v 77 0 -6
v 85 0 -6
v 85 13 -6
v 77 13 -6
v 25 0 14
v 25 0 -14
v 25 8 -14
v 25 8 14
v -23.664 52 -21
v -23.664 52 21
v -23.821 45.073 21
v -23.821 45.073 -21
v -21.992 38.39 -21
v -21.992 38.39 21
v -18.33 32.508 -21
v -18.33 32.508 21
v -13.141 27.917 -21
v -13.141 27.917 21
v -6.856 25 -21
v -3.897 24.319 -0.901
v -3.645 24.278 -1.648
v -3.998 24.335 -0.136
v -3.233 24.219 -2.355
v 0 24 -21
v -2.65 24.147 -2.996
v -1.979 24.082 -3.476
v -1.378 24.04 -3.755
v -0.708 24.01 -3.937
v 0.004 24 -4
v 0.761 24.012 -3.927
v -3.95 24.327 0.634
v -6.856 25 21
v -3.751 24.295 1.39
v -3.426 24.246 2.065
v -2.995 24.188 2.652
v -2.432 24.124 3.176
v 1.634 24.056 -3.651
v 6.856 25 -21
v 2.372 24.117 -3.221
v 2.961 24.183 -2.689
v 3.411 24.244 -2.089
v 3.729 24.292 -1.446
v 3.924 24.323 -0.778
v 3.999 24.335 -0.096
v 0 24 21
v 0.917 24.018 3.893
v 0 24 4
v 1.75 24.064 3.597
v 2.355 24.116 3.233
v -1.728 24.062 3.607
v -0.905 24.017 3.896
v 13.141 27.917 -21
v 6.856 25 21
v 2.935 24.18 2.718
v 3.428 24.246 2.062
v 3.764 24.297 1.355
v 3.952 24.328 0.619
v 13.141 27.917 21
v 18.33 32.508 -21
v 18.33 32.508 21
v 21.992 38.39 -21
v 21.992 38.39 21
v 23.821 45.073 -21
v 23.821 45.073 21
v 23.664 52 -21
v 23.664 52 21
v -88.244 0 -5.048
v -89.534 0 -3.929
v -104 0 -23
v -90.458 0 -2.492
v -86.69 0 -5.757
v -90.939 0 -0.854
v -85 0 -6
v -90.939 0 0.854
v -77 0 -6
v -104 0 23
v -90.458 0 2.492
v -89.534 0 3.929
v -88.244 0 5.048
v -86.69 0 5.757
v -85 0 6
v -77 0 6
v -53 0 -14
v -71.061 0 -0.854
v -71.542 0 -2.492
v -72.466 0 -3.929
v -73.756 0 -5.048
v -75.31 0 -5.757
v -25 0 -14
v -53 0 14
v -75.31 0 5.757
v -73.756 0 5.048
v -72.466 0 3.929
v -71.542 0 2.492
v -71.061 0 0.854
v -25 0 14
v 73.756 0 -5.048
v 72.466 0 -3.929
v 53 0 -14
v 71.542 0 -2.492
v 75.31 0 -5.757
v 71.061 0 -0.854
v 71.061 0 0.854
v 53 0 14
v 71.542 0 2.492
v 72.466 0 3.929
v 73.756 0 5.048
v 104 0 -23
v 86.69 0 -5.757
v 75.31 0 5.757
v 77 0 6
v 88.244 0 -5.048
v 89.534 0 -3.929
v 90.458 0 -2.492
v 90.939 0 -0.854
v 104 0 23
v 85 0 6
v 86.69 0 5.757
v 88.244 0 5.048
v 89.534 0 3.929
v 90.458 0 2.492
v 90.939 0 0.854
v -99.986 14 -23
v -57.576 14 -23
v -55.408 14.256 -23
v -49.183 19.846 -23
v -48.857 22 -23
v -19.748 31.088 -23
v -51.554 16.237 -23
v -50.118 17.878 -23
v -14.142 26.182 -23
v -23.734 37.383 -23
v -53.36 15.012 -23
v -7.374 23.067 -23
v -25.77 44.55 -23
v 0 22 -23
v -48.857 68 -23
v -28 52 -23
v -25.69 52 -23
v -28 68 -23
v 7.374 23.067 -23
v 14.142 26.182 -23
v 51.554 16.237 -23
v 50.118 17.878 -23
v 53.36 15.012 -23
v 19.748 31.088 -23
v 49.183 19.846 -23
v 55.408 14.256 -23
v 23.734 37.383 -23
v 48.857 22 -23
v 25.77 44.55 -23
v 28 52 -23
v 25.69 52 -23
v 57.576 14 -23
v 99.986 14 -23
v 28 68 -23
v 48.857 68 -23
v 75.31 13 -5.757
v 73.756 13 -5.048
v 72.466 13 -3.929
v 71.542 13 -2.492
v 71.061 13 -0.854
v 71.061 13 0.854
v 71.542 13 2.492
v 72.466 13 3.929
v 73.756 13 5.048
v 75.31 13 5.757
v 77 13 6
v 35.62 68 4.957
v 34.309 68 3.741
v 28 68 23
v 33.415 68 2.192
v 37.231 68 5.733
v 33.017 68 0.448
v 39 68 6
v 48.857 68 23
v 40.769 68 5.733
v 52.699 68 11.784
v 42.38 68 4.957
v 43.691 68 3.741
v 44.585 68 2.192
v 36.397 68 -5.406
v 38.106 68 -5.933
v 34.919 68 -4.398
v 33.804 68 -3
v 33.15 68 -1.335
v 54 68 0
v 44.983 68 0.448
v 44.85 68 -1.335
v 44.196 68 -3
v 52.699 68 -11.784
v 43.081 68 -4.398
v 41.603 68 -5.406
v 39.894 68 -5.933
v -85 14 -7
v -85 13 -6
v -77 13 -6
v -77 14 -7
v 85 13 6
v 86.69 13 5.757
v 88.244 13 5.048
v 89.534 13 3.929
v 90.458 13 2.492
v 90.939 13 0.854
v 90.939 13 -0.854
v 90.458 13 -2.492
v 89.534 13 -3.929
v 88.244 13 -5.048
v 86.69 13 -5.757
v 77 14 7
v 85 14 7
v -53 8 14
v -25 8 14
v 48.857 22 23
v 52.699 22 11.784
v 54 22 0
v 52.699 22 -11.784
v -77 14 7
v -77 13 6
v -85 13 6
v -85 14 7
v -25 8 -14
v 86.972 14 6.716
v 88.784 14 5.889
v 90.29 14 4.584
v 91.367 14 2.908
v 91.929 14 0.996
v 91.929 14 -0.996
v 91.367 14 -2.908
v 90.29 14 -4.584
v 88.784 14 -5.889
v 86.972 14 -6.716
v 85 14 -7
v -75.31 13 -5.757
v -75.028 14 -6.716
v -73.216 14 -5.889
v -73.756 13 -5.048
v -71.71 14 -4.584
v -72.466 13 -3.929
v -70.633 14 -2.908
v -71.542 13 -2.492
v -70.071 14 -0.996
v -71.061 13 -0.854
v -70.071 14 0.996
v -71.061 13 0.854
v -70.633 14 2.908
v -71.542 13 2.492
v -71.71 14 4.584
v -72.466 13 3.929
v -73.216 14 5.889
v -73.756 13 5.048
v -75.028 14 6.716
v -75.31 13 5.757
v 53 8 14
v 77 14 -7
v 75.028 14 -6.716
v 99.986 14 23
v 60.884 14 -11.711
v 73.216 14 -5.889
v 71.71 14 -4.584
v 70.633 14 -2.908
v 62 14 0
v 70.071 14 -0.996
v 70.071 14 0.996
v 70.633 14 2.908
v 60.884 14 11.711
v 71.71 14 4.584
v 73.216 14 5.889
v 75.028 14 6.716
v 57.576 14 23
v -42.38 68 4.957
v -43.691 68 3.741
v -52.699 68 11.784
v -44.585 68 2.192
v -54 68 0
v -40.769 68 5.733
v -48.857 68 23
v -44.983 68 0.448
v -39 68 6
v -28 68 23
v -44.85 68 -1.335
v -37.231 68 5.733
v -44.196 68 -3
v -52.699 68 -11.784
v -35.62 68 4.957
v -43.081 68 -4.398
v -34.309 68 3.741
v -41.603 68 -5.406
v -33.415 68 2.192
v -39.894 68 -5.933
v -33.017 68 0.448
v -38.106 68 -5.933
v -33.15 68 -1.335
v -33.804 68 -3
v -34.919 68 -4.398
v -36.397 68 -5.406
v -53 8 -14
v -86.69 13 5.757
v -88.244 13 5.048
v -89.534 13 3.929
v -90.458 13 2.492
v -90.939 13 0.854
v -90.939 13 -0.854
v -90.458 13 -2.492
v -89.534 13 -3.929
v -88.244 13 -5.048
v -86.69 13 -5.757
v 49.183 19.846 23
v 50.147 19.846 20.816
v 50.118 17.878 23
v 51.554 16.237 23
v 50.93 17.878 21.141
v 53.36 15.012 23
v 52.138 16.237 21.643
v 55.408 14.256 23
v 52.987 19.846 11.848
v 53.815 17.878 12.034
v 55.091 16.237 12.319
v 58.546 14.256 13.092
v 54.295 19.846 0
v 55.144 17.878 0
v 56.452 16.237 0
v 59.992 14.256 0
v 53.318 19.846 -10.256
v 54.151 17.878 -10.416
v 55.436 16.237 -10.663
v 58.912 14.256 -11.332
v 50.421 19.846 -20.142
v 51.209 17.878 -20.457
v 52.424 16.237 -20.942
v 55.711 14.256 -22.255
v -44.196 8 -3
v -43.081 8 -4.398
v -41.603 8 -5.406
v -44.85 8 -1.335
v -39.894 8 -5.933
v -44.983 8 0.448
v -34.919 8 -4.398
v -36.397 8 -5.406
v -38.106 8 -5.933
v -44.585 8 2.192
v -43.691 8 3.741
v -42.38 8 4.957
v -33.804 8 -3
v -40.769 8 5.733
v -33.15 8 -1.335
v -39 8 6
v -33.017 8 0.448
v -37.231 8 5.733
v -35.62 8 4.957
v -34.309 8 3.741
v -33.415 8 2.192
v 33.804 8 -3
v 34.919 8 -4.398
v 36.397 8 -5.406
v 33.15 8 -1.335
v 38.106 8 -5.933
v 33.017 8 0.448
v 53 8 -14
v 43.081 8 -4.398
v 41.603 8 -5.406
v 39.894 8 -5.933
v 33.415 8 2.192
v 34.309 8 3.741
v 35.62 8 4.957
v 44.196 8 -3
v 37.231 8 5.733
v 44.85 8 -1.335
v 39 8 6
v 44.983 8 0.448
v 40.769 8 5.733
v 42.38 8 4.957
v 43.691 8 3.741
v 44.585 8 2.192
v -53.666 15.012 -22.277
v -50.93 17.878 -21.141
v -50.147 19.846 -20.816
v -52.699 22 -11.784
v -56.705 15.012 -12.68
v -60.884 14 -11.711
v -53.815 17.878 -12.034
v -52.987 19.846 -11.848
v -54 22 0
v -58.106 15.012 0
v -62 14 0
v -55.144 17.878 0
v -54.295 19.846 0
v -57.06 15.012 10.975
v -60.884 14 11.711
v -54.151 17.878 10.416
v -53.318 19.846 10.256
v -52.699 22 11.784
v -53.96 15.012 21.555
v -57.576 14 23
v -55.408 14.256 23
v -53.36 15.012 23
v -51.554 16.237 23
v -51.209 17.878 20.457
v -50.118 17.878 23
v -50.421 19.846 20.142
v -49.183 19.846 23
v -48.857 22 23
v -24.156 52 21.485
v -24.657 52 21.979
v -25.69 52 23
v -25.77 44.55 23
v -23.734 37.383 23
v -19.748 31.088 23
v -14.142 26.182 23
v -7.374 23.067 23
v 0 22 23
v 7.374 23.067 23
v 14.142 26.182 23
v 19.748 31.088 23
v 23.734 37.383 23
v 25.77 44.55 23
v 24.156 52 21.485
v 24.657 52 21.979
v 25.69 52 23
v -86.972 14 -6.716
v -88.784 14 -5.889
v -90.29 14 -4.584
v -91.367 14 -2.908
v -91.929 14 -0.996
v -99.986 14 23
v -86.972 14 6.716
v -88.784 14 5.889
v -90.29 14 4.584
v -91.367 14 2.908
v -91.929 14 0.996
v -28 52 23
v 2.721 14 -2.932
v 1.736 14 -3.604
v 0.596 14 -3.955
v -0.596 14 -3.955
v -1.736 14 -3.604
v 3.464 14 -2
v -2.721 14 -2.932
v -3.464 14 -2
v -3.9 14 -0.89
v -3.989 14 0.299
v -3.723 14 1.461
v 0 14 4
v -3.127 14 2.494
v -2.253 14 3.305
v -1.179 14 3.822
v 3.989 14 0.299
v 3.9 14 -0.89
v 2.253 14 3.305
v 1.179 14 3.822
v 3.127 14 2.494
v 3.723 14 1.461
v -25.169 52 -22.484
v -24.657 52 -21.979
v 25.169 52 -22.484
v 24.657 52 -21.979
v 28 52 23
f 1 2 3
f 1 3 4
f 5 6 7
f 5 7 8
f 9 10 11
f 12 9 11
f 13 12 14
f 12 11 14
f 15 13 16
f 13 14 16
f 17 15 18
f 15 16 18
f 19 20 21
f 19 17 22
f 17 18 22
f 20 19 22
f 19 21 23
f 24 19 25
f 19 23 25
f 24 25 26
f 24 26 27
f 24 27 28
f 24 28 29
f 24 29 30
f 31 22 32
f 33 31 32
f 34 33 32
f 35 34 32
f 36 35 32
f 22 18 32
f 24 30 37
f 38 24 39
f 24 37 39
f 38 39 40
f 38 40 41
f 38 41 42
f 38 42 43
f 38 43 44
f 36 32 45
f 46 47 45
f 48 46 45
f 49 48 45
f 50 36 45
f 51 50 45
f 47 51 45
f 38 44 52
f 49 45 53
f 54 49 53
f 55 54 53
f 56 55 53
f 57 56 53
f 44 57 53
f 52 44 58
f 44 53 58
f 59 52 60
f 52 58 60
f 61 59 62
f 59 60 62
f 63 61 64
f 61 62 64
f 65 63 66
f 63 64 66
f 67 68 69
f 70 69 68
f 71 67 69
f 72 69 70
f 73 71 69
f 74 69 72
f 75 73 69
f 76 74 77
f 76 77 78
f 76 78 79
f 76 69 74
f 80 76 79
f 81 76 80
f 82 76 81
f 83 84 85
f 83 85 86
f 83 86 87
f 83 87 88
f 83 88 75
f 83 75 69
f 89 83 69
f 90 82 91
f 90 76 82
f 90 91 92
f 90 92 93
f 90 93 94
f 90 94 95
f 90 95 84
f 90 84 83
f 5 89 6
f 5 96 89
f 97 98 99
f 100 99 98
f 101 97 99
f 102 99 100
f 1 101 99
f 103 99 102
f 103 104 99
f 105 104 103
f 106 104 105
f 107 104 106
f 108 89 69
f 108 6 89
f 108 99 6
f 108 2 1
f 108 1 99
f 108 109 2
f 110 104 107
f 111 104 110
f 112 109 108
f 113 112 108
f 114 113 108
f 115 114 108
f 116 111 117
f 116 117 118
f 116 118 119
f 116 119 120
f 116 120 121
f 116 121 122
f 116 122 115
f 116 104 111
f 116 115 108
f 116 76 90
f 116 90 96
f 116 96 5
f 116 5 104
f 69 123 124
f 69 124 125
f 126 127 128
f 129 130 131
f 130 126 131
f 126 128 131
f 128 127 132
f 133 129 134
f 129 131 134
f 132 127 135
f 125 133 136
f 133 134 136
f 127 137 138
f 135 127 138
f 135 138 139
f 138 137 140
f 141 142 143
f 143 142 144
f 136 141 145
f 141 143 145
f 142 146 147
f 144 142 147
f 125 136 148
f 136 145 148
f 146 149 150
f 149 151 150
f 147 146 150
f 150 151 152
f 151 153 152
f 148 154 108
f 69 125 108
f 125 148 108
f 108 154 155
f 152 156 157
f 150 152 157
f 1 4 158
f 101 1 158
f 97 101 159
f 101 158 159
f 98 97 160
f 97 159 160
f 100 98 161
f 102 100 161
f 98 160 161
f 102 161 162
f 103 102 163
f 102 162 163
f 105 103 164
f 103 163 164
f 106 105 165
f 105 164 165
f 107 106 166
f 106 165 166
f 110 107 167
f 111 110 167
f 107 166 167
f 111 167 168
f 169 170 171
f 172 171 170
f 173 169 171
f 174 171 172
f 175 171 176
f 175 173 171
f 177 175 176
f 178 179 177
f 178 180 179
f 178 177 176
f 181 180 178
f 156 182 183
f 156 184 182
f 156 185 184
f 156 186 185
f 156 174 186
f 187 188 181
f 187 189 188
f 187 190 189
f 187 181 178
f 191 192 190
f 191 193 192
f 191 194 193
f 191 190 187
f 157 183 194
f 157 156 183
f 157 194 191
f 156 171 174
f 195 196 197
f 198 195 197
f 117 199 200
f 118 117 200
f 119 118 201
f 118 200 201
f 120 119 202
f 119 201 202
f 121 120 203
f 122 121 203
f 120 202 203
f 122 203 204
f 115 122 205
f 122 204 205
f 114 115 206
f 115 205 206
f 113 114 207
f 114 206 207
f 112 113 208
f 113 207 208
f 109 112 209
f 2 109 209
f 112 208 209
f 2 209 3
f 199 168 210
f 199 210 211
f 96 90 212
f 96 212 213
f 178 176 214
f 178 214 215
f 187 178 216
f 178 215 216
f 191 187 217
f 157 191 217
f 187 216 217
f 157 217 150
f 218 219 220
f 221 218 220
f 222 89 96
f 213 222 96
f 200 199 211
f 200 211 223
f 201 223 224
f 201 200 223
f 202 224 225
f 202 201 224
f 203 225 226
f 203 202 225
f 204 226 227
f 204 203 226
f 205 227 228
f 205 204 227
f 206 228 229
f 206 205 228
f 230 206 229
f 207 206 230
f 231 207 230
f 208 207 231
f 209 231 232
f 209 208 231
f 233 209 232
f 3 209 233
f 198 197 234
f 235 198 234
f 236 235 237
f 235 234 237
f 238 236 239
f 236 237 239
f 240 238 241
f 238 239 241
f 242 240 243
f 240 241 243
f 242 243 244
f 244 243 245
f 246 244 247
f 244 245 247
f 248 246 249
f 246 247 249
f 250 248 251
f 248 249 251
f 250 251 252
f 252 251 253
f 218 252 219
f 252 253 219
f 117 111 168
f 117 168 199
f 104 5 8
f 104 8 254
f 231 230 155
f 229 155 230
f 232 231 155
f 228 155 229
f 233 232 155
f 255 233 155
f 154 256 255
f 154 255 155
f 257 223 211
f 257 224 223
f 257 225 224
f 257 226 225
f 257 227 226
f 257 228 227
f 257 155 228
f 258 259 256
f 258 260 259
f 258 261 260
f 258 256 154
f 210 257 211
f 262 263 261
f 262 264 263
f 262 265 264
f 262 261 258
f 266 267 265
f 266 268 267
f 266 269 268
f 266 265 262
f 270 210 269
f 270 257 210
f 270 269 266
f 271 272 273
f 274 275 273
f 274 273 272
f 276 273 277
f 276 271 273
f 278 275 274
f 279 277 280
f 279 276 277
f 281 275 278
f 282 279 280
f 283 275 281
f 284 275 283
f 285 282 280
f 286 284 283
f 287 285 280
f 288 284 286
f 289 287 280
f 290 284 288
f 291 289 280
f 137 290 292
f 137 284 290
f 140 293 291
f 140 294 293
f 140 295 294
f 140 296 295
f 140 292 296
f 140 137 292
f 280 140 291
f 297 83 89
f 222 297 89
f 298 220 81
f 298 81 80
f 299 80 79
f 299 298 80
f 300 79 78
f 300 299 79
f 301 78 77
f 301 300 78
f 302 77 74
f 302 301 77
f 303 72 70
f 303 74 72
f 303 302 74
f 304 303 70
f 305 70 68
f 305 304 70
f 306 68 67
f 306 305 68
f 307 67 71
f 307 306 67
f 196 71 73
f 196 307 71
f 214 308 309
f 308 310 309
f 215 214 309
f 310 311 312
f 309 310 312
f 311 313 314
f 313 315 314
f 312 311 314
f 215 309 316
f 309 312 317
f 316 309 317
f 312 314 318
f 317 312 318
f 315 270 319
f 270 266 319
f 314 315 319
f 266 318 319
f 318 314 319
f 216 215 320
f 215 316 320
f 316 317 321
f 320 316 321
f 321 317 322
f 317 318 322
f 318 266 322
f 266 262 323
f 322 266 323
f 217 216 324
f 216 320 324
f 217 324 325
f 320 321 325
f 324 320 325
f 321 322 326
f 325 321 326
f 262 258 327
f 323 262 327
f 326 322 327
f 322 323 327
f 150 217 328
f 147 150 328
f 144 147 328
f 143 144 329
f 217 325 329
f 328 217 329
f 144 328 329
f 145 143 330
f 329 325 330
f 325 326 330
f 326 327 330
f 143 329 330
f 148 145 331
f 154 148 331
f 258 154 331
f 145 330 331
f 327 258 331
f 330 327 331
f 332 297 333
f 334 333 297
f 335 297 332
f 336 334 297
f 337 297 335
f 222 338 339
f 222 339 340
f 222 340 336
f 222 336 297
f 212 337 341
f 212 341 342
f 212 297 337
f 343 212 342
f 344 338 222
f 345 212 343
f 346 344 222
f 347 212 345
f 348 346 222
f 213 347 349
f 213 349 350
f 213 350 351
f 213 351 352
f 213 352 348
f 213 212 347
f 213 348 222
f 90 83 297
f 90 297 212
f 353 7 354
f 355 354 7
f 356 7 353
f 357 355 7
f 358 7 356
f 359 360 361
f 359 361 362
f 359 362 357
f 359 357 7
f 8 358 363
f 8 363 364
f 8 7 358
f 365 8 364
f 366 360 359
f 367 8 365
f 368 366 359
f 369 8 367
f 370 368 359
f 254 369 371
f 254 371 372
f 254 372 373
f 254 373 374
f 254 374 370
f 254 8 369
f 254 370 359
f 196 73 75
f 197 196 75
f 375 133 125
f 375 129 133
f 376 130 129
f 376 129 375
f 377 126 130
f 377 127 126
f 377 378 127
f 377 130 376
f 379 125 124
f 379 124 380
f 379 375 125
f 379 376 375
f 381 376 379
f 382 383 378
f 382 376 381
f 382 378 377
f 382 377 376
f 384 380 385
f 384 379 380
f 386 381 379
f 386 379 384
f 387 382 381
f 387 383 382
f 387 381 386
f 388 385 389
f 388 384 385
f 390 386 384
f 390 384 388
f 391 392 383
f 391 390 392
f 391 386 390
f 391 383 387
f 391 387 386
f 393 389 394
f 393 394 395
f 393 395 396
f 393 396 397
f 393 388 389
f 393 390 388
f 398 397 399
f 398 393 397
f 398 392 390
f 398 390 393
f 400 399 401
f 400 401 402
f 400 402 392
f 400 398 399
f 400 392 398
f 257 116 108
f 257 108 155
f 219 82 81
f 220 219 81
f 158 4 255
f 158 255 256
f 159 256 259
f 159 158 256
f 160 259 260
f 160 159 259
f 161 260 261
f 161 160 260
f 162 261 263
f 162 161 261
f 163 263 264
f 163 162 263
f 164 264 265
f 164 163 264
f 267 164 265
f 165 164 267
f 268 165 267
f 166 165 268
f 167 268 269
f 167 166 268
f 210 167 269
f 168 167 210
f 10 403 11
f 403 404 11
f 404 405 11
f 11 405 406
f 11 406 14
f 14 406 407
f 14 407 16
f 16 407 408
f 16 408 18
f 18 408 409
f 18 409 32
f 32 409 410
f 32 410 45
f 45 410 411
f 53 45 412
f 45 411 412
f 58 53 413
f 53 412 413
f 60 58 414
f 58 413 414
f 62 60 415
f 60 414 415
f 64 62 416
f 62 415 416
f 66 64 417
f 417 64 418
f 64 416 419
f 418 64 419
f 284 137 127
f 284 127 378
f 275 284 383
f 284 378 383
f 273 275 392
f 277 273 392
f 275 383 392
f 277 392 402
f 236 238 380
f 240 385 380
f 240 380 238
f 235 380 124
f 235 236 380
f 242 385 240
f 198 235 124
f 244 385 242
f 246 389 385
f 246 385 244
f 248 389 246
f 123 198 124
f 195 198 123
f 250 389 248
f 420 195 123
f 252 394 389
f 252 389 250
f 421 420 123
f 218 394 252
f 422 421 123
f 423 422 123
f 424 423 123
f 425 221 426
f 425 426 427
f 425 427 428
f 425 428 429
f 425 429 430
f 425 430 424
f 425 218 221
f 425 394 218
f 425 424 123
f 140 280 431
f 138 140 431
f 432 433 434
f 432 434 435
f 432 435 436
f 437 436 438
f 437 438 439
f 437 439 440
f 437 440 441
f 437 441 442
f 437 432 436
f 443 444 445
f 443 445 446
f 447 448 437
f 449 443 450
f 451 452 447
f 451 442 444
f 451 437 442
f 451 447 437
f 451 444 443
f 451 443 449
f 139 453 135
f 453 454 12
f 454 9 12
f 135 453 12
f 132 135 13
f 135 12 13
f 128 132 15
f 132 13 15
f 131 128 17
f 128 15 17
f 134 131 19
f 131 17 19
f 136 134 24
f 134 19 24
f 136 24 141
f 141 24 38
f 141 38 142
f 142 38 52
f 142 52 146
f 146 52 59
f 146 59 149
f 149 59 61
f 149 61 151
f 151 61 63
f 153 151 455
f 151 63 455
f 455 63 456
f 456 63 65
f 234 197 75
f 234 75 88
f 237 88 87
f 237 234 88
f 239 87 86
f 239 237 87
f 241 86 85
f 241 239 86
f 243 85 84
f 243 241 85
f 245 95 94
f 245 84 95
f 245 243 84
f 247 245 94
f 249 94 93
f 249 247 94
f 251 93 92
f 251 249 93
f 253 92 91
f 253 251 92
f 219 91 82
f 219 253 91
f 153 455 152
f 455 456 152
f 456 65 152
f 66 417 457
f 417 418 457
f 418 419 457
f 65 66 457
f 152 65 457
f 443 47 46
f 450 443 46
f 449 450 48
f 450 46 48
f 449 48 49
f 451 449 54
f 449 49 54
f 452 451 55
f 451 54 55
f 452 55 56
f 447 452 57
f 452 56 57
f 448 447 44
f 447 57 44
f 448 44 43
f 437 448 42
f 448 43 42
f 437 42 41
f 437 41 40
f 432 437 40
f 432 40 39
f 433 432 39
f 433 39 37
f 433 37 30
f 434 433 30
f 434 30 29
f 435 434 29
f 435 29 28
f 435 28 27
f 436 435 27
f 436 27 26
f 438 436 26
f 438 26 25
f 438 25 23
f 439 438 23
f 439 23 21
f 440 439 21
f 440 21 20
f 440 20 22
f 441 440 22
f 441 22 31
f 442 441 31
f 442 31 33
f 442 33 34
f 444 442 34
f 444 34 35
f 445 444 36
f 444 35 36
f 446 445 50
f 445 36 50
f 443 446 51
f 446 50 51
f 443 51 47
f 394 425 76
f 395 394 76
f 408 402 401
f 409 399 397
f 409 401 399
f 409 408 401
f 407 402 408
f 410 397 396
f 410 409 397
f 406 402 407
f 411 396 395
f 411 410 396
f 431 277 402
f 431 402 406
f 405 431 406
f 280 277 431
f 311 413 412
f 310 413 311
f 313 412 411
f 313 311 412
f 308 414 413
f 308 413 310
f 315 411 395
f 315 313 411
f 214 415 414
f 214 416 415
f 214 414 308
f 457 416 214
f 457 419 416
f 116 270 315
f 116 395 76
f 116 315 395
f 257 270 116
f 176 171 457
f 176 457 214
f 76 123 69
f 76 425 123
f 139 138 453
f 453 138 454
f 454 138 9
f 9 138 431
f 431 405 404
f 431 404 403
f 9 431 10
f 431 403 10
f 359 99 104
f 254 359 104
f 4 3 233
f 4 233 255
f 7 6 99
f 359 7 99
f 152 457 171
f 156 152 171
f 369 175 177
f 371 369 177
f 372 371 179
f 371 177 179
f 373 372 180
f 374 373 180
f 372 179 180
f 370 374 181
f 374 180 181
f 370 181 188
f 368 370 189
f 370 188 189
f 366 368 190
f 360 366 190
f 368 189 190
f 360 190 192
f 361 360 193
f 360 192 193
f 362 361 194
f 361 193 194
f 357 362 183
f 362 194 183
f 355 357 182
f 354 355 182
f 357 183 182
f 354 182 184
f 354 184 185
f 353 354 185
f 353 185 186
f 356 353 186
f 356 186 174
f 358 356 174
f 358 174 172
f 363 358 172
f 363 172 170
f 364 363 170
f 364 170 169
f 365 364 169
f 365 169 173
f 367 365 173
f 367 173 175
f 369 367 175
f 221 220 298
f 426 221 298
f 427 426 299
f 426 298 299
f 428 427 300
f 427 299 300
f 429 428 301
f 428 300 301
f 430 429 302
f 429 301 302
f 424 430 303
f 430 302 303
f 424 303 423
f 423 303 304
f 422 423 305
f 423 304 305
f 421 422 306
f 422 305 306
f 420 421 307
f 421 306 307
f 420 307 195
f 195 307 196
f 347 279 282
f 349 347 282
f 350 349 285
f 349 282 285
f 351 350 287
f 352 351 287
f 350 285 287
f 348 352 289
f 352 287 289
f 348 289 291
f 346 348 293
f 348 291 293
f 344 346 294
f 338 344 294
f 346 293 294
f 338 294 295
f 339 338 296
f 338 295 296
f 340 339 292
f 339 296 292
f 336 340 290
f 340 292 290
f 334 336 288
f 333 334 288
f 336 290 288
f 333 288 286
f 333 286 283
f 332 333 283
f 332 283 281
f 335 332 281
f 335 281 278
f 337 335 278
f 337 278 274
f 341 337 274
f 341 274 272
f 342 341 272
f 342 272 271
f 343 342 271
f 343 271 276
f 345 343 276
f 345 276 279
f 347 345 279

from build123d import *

# Parameters (mm, degrees)
BOSS_EXTRUDE1_DEPTH = 23
BOSS_EXTRUDE2_DEPTH = 54
CUT_EXTRUDE1_DEPTH  = 47
SKETCH4_R           = 6
CUT_EXTRUDE2_DEPTH  = 69
SKETCH5_W           = 28
SKETCH5_H           = 28
CUT_EXTRUDE3_DEPTH  = 8
CUT_EXTRUDE4_DEPTH  = 15
SKETCH7_R           = 4
CUT_EXTRUDE5_DEPTH  = 54
FILLET1_R           = 8
CHAMFER1_SIZE       = 2
CHAMFER2_SIZE       = 1


with BuildPart() as part:
    # Sketch1 → Boss-Extrude1 (new body, symmetric)
    with BuildSketch(Plane.XY):
        Polygon((-104, 0), (104, 0), (99.985564599, 14), (-99.985564599, 14), align=None)
    extrude(amount=BOSS_EXTRUDE1_DEPTH, both=True)

    # Sketch2 → Boss-Extrude2 (add)
    with BuildSketch(Plane(origin=(0, 14, 0), x_dir=(1, 0, 0), z_dir=(0, 1, 0))):
        with BuildLine():
            Line((48.856934001, 23), (-48.856934001, 23))
            ThreePointArc((-48.856934001, 23), (-54, 0), (-48.856934001, -23))
            Line((-48.856934001, -23), (48.856934001, -23))
            ThreePointArc((48.856934001, -23), (54, 0), (48.856934001, 23))
        make_face()
    extrude(amount=BOSS_EXTRUDE2_DEPTH)

    # Sketch3 → Cut-Extrude1 (cut, through all)
    with BuildSketch(Plane.XY.offset(23)):
        with BuildLine():
            Line((-28, 68), (-28, 52))
            Line((-28, 52), (-23.664319132, 52))
            ThreePointArc((-23.664319132, 52), (0, 24), (23.664319132, 52))
            Line((23.664319132, 52), (28, 52))
            Line((28, 52), (28, 68))
            Line((28, 68), (-28, 68))
        make_face()
    extrude(amount=-CUT_EXTRUDE1_DEPTH, mode=Mode.SUBTRACT)

    # Sketch4 → Cut-Extrude2 (cut, through all)
    with BuildSketch(Plane(origin=(0, 68, 0), x_dir=(1, 0, 0), z_dir=(0, 1, 0))):
        with Locations(Location((-39, 0, 0), (0, 0, 270))):  # turned: the seam where the file's is
            Circle(SKETCH4_R)
        with Locations(Location((39, 0, 0), (0, 0, 270))):  # turned: the seam where the file's is
            Circle(SKETCH4_R)
    extrude(amount=-CUT_EXTRUDE2_DEPTH, mode=Mode.SUBTRACT)

    # Sketch5 → Cut-Extrude3 (cut)
    with BuildSketch(Plane.XZ):
        with Locations((-39, 0)):
            Rectangle(SKETCH5_W, SKETCH5_H)
        with Locations((39, 0)):
            Rectangle(SKETCH5_W, SKETCH5_H)
    extrude(amount=-CUT_EXTRUDE3_DEPTH, mode=Mode.SUBTRACT)

    # Sketch6 → Cut-Extrude4 (cut, through all)
    with BuildSketch(Plane(origin=(0, 14, 0), x_dir=(1, 0, 0), z_dir=(0, 1, 0))):
        with BuildLine():
            Line((-85, 6), (-77, 6))
            ThreePointArc((-77, 6), (-71, 0), (-77, -6))
            Line((-77, -6), (-85, -6))
            ThreePointArc((-85, -6), (-91, 0), (-85, 6))
        make_face()
    cut_extrude4 = extrude(amount=-CUT_EXTRUDE4_DEPTH, mode=Mode.SUBTRACT)

    # Mirror1: Cut-Extrude4 across plane
    add(cut_extrude4.mirror(Plane(origin=(0, 0, 0), x_dir=(0, 0, 1), z_dir=(1, 0, 0))), mode=Mode.SUBTRACT)

    # Sketch7 → Cut-Extrude5 (cut)
    with BuildSketch(Plane(origin=(0, 68, 0), x_dir=(1, 0, 0), z_dir=(0, 1, 0))):
        with Locations(Location((0, 0, 0), (0, 0, 270))):  # turned: the seam where the file's is
            Circle(SKETCH7_R)
    extrude(amount=-CUT_EXTRUDE5_DEPTH, mode=Mode.SUBTRACT)

    # Fillet1
    fillet1_edges = [part.edges().sort_by_distance(p)[0] for p in [
        (54, 14, 0),
        (-54, 14, 0),
    ]]
    fillet(fillet1_edges, radius=FILLET1_R)

    # Chamfer1
    chamfer1_edges = [part.edges().sort_by_distance(p)[0] for p in [
        (0, 24, -23),
        (0, 24, 23),
    ]]
    chamfer(chamfer1_edges, length=CHAMFER1_SIZE)

    # Chamfer2
    chamfer2_edges = [part.edges().sort_by_distance(p)[0] for p in [
        (91, 14, 0),
        (81, 14, 6),
        (71, 14, 0),
        (81, 14, -6),
        (-91, 14, 0),
        (-81, 14, 6),
        (-71, 14, 0),
        (-81, 14, -6),
    ]]
    chamfer(chamfer2_edges, length=CHAMFER2_SIZE)


solid = part.part
